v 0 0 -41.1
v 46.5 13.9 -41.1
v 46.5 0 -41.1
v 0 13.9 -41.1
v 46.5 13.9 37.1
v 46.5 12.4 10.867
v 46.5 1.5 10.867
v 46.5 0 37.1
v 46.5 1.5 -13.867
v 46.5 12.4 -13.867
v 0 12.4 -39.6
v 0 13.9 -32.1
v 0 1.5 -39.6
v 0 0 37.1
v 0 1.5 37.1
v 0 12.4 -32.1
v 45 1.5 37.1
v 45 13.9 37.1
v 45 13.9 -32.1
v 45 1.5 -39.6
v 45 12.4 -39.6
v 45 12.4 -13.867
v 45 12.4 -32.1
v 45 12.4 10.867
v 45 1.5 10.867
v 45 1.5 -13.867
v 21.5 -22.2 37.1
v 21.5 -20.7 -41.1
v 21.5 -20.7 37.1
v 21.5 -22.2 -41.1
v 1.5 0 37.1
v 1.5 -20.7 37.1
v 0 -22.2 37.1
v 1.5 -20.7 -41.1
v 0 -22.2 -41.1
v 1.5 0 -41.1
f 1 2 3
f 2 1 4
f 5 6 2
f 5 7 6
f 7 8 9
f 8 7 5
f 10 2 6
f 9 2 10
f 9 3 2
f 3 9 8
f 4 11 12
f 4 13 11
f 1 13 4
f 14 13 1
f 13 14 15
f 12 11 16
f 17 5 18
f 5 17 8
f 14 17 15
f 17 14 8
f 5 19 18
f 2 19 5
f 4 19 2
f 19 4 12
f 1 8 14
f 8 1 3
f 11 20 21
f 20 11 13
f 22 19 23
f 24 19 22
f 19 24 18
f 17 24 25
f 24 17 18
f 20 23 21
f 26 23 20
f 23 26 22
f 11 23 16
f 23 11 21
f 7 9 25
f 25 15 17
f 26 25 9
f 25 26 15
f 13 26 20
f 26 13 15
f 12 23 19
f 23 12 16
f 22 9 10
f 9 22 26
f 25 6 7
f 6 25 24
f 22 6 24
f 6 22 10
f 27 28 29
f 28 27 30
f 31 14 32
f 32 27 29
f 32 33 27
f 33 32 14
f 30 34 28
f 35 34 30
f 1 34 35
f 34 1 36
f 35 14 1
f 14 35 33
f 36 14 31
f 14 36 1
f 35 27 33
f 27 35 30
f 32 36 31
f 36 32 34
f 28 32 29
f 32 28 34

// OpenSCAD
use <MCAD/regular_shapes.scad>

r = 32.6/2;
h = 20;
t = 1.5;

p_h = 45;
p_w = 74.2;
p_d = 9.9;
eps = 1;
o = 5;

rotate([0, 90, 0]){
    translate([-p_w/2, 0, 0])
    difference(){
        cube([p_w + eps + 2*t, p_d + eps + 2*t, p_h + t]);
        translate([0, t, 0])
        cube([p_w + eps + t, p_d + eps, p_h]);
        translate([0, p_d+t, 0])
        cube([p_w - o, 2*t, p_h]);
        translate([t + p_w/3, t, 0])
        cube([p_w/3, p_d + eps, p_h * 2]);
    }
}

b_w = 20.7;
b_h = 20;

hh = p_w + 2*t + eps;

translate([0, - b_w - t, -p_w/2 - 2*t - eps])
difference(){
    cube([b_h + t, b_w + t, hh]);
    translate([t, t, 0])
    cube([b_h, b_w, hh]);
}
